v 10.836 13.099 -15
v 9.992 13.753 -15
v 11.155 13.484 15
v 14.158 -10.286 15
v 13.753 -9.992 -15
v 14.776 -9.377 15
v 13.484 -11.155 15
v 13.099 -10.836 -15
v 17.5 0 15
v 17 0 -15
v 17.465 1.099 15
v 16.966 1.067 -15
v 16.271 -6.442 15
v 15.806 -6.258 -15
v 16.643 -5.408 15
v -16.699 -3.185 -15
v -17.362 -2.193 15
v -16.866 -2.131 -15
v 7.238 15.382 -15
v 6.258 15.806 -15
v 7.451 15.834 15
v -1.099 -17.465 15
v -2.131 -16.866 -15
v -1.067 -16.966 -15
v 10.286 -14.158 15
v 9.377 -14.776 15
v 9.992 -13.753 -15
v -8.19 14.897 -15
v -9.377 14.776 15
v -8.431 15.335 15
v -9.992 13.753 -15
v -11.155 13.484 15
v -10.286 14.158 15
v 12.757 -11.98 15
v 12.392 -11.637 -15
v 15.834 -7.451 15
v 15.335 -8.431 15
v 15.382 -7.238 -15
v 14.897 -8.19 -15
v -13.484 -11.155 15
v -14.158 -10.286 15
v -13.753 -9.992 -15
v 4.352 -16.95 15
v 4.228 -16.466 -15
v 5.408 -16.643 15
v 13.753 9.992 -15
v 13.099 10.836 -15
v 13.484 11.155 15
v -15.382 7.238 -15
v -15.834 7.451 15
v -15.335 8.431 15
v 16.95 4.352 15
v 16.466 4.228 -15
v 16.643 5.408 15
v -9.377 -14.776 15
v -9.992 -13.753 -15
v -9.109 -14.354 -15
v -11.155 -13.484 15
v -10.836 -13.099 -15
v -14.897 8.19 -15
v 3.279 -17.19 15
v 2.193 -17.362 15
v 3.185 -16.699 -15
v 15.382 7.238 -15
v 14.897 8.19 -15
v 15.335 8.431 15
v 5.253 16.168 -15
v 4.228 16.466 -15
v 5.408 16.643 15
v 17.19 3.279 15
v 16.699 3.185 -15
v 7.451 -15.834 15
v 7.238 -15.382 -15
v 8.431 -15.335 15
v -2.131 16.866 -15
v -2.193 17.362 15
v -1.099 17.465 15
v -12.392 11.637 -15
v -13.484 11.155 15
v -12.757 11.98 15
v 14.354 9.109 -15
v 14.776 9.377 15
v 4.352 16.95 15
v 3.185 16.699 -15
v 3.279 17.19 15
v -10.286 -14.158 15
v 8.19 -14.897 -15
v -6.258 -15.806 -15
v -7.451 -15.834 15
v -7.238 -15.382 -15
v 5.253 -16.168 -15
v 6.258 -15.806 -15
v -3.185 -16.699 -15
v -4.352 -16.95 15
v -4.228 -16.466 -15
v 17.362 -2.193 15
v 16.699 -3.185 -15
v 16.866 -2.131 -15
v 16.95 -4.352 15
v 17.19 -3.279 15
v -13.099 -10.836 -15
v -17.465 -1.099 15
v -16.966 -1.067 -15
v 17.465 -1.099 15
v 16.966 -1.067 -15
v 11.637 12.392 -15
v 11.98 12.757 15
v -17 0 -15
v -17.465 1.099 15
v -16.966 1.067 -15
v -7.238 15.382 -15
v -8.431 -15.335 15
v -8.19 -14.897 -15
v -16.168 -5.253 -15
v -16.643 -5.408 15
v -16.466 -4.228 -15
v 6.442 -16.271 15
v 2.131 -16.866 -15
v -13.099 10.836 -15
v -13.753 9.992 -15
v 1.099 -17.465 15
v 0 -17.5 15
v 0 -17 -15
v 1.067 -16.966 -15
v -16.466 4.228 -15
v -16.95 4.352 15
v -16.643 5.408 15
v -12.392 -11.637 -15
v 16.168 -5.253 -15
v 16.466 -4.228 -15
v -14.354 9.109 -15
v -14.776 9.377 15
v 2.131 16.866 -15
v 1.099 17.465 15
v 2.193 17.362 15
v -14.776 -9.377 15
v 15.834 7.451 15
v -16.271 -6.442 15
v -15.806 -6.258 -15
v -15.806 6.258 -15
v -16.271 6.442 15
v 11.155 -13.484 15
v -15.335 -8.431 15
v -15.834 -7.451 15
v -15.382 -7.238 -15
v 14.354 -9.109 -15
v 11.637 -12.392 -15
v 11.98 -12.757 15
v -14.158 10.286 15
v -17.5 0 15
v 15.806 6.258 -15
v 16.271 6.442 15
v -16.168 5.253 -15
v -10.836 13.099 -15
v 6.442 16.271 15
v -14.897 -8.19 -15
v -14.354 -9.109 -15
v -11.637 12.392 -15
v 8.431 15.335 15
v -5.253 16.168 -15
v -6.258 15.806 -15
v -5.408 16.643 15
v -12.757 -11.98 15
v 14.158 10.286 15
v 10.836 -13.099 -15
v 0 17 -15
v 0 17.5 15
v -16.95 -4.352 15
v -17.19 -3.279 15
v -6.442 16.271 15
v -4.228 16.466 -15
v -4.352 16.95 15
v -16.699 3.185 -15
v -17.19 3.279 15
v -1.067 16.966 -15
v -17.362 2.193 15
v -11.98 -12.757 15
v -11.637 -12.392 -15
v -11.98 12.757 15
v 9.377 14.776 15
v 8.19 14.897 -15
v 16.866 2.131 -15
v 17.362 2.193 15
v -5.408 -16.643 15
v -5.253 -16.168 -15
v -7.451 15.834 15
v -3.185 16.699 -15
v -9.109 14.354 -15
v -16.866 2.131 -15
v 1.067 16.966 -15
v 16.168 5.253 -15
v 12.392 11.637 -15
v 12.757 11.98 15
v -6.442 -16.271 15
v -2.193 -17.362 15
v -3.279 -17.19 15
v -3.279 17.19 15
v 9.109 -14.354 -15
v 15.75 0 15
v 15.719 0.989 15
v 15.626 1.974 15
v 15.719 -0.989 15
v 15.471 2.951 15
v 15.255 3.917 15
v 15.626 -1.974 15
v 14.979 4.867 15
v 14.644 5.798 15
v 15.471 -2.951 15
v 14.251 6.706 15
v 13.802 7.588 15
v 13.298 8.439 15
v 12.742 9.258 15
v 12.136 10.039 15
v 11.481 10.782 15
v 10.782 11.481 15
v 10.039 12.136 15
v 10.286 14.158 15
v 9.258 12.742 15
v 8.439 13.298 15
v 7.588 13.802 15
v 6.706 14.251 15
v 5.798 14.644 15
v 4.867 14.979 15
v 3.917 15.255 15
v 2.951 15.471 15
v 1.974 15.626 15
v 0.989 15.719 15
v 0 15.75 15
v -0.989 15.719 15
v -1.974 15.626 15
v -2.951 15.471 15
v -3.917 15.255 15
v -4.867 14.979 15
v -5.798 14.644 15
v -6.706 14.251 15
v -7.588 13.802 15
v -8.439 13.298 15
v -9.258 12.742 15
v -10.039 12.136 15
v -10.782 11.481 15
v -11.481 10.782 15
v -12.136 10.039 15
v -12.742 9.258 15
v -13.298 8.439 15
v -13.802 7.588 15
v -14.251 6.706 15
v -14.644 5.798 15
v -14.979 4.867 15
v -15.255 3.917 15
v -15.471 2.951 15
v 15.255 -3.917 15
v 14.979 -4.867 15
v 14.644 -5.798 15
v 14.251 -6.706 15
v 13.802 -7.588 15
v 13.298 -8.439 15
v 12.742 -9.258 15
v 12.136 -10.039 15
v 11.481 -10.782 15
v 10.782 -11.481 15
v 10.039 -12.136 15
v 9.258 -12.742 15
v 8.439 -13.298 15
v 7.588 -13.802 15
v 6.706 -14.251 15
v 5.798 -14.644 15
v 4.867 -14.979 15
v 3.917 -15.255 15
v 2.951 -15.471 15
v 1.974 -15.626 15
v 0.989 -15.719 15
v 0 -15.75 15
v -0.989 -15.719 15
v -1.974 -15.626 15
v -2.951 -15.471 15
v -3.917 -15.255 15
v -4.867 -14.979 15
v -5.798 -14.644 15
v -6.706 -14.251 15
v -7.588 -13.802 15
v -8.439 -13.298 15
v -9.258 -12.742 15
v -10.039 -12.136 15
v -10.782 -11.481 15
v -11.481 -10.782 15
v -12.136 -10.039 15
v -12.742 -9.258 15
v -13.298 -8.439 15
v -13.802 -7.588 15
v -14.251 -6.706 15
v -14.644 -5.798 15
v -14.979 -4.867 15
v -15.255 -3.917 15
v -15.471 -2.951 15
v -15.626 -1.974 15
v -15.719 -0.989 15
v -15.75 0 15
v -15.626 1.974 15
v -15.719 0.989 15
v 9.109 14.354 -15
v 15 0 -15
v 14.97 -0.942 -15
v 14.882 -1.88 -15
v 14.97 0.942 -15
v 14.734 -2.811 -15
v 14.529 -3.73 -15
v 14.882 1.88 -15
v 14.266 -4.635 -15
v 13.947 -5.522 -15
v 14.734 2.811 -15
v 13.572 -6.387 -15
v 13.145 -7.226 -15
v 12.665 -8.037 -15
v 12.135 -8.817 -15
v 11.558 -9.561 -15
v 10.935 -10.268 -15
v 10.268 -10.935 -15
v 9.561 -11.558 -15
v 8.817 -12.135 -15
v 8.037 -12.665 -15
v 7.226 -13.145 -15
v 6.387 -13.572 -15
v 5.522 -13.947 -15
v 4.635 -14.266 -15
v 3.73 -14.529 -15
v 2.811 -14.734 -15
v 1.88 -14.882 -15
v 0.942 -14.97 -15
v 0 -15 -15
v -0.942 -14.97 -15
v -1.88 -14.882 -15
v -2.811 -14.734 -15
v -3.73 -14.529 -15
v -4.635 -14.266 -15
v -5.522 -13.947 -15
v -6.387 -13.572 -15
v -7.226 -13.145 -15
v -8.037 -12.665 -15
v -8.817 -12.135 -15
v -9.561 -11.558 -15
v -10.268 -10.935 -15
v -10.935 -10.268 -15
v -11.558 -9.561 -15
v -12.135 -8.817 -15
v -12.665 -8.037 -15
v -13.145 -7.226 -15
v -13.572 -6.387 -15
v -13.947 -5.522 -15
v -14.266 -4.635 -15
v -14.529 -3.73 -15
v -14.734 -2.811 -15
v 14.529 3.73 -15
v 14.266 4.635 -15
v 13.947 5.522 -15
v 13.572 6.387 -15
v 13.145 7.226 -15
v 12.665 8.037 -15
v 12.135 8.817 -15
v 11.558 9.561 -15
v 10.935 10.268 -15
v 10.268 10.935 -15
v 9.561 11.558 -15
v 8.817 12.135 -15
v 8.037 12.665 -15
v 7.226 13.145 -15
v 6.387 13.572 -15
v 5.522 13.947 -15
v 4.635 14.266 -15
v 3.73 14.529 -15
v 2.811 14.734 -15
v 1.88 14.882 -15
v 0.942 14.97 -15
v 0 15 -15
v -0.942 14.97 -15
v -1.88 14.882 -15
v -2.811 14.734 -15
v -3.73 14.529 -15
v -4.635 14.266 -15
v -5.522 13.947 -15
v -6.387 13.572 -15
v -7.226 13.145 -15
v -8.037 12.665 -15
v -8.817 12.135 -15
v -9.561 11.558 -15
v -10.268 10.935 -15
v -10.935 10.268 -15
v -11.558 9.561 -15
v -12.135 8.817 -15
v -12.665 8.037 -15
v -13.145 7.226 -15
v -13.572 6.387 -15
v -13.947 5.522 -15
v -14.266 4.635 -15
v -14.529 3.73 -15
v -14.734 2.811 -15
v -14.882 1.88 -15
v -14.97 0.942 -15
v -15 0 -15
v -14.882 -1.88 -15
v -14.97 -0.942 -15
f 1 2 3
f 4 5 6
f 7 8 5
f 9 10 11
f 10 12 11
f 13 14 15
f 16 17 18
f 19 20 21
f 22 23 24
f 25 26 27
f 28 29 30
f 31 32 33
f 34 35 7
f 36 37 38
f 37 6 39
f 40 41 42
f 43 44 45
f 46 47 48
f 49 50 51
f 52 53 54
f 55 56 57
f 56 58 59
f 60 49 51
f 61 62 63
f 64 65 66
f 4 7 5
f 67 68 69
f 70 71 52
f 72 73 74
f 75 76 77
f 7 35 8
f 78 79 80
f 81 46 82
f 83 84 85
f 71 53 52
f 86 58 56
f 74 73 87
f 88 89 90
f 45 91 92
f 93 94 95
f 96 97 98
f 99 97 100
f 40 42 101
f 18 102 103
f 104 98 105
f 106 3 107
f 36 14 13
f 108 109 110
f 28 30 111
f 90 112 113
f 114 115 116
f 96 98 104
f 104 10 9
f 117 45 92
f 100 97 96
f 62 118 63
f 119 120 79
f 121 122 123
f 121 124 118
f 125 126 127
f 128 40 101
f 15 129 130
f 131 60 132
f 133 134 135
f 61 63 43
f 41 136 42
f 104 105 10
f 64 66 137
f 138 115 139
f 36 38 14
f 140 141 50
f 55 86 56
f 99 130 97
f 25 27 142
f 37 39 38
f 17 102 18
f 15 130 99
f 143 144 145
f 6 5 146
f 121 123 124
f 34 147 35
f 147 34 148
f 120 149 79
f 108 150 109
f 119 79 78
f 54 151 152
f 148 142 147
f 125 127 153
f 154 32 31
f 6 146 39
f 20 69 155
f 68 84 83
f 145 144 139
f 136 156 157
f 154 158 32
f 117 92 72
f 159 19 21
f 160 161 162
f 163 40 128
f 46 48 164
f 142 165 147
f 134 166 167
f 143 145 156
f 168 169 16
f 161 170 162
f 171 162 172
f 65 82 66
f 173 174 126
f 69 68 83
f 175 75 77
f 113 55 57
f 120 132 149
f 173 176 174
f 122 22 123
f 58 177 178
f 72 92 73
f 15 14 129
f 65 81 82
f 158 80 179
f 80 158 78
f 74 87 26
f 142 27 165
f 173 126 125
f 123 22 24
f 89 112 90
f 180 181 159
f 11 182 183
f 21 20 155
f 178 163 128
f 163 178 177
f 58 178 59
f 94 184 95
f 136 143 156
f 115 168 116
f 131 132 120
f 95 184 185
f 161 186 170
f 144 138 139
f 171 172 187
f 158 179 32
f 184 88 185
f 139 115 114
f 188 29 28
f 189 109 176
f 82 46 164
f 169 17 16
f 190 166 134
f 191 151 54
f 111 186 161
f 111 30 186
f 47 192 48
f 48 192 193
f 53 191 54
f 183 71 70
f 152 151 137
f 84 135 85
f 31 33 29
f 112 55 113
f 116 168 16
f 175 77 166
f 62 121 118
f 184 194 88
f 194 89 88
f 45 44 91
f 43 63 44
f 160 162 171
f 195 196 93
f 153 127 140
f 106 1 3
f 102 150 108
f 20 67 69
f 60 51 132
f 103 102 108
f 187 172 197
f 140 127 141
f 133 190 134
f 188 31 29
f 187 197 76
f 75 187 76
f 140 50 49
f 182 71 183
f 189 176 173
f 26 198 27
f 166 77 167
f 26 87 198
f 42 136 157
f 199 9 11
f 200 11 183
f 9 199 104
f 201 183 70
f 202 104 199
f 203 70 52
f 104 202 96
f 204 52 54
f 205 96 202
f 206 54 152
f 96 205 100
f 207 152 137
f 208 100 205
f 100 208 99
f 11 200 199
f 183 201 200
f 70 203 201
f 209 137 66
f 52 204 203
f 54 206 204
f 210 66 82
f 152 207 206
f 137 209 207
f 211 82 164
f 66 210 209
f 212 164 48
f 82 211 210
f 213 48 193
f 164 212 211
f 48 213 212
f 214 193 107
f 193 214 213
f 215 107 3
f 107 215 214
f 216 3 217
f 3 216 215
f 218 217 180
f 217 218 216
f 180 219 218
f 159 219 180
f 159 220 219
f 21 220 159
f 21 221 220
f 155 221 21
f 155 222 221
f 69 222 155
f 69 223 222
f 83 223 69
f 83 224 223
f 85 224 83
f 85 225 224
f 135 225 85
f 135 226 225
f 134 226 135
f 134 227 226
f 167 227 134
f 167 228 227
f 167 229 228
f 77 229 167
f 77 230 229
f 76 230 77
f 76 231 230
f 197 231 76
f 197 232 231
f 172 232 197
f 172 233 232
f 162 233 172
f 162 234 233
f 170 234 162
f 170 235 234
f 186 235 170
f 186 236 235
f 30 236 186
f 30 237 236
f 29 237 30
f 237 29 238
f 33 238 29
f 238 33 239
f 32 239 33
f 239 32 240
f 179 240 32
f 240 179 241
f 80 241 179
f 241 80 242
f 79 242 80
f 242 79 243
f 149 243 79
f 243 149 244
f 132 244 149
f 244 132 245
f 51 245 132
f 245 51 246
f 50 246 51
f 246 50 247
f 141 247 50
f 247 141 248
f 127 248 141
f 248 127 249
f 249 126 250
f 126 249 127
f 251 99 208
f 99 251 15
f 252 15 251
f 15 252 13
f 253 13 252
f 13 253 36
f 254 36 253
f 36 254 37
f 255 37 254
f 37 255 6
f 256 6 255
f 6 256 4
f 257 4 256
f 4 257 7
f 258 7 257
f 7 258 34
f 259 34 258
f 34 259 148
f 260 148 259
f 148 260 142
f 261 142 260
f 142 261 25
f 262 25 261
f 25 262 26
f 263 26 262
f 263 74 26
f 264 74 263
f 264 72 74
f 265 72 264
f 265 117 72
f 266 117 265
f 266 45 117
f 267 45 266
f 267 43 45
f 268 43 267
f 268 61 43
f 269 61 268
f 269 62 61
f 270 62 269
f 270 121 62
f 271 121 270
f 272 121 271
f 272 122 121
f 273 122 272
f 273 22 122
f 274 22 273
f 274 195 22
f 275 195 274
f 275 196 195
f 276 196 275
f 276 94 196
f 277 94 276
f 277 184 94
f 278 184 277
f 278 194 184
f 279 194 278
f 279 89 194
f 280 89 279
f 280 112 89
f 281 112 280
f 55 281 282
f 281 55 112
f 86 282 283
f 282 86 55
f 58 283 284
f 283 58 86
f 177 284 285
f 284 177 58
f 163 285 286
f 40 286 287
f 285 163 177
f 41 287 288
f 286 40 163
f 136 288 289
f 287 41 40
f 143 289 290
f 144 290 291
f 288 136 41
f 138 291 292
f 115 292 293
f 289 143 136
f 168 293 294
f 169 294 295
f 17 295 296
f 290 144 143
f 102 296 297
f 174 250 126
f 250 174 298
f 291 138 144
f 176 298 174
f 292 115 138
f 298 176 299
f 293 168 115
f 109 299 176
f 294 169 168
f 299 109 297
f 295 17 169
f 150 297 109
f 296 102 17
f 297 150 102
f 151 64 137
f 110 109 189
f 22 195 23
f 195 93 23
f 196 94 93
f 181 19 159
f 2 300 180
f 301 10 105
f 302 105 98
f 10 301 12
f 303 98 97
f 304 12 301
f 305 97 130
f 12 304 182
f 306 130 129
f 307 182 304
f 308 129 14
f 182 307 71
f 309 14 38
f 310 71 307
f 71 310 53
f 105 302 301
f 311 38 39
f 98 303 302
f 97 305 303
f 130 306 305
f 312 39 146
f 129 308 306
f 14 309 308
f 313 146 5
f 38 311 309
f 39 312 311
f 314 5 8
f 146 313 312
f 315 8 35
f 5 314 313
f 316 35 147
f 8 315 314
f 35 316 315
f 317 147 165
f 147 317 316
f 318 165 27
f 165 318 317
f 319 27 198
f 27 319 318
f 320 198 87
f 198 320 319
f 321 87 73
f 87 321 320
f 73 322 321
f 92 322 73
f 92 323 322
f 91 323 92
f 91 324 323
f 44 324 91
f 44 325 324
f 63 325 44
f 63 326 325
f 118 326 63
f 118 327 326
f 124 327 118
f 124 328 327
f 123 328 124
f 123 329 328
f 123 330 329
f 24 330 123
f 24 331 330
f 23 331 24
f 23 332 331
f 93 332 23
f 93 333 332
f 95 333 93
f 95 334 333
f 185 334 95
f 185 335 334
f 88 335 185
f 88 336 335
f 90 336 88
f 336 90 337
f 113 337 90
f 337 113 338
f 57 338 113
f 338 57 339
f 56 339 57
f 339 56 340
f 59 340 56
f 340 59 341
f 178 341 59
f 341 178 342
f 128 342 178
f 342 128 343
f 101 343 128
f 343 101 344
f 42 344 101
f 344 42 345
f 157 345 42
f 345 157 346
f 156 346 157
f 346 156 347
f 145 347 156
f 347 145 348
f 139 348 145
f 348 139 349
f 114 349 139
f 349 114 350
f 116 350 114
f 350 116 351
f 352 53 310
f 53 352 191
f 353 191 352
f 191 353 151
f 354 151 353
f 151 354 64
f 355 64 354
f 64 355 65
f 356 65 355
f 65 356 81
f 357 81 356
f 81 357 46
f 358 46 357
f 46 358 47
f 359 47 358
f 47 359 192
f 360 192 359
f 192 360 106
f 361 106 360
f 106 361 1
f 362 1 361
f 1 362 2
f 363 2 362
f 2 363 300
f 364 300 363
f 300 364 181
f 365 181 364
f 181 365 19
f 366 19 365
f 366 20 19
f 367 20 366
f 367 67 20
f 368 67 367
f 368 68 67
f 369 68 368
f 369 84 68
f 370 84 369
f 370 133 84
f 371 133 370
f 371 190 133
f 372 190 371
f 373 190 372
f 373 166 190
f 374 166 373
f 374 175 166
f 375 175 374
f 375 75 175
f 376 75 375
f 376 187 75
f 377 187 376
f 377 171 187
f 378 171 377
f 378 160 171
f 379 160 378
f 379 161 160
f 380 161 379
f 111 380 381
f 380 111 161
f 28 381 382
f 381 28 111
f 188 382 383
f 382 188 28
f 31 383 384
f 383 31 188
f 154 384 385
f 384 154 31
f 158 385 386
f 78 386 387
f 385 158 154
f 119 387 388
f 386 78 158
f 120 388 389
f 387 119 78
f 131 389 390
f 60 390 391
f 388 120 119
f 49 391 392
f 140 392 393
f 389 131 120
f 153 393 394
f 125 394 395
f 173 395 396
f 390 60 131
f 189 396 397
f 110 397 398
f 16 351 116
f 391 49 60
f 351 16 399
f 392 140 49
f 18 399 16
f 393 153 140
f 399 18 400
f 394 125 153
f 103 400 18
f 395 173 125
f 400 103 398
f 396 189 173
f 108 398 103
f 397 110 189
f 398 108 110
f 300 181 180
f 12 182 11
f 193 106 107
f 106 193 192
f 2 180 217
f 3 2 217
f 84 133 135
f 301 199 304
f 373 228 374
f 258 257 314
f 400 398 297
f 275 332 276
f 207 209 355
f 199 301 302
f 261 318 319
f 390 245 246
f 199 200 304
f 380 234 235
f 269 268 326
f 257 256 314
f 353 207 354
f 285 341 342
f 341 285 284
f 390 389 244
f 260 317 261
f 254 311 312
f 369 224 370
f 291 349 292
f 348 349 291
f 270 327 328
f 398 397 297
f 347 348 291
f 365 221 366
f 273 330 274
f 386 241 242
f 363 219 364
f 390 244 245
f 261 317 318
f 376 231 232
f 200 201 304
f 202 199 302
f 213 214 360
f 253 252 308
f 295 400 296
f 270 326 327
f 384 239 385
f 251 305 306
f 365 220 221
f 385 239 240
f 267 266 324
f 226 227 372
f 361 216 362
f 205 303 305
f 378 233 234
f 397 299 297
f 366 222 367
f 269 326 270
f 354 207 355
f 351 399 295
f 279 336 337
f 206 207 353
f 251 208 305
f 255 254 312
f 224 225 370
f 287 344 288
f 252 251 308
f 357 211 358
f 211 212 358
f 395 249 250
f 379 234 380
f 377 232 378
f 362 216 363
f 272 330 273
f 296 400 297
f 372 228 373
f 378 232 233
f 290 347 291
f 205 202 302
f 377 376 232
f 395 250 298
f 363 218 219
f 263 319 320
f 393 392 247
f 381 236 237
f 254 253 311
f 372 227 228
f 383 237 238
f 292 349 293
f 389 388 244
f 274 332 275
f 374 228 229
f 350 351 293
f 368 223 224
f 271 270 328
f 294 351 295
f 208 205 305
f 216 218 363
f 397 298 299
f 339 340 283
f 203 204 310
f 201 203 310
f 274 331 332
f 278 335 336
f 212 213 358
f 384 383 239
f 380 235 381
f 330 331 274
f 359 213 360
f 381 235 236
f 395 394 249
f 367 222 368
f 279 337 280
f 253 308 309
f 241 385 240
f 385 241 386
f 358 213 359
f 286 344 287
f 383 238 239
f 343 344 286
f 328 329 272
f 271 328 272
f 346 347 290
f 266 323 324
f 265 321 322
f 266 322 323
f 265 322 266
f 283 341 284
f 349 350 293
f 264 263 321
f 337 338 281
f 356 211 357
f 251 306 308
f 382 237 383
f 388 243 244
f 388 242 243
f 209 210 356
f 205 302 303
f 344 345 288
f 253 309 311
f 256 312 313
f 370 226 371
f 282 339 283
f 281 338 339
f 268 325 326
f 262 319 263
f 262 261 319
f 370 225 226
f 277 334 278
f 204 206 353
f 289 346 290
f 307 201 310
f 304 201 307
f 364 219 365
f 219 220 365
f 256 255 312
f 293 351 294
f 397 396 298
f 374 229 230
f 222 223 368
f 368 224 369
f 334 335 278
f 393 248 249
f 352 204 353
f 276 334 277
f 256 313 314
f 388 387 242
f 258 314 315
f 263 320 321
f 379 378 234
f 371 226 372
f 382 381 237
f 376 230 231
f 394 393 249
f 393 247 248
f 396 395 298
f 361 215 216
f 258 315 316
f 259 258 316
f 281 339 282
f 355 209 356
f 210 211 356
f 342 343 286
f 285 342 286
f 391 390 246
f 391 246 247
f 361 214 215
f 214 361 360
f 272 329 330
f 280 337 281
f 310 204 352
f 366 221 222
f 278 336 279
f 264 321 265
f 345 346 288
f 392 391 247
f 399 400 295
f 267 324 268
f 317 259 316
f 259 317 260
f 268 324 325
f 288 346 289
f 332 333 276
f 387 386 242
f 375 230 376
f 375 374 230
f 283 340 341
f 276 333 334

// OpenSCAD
//35 mm diameter of attachment
//30 mm initial dia of vacuum hose
//31.5 mm final dia of vacuum hose
//30 mm lenght of attachment

$fn=100;

attachmentHeight = 30;
receptorDiameter = 35;
vacuumHoseStartDia = 30;
vacuumHoseEndDia = 31.5;

difference()
{
cylinder(d1 = receptorDiameter-1, d2 = receptorDiameter , h=attachmentHeight, center=true);
cylinder(d1 = vacuumHoseStartDia, d2 = vacuumHoseEndDia , h=attachmentHeight, center=true);
}
